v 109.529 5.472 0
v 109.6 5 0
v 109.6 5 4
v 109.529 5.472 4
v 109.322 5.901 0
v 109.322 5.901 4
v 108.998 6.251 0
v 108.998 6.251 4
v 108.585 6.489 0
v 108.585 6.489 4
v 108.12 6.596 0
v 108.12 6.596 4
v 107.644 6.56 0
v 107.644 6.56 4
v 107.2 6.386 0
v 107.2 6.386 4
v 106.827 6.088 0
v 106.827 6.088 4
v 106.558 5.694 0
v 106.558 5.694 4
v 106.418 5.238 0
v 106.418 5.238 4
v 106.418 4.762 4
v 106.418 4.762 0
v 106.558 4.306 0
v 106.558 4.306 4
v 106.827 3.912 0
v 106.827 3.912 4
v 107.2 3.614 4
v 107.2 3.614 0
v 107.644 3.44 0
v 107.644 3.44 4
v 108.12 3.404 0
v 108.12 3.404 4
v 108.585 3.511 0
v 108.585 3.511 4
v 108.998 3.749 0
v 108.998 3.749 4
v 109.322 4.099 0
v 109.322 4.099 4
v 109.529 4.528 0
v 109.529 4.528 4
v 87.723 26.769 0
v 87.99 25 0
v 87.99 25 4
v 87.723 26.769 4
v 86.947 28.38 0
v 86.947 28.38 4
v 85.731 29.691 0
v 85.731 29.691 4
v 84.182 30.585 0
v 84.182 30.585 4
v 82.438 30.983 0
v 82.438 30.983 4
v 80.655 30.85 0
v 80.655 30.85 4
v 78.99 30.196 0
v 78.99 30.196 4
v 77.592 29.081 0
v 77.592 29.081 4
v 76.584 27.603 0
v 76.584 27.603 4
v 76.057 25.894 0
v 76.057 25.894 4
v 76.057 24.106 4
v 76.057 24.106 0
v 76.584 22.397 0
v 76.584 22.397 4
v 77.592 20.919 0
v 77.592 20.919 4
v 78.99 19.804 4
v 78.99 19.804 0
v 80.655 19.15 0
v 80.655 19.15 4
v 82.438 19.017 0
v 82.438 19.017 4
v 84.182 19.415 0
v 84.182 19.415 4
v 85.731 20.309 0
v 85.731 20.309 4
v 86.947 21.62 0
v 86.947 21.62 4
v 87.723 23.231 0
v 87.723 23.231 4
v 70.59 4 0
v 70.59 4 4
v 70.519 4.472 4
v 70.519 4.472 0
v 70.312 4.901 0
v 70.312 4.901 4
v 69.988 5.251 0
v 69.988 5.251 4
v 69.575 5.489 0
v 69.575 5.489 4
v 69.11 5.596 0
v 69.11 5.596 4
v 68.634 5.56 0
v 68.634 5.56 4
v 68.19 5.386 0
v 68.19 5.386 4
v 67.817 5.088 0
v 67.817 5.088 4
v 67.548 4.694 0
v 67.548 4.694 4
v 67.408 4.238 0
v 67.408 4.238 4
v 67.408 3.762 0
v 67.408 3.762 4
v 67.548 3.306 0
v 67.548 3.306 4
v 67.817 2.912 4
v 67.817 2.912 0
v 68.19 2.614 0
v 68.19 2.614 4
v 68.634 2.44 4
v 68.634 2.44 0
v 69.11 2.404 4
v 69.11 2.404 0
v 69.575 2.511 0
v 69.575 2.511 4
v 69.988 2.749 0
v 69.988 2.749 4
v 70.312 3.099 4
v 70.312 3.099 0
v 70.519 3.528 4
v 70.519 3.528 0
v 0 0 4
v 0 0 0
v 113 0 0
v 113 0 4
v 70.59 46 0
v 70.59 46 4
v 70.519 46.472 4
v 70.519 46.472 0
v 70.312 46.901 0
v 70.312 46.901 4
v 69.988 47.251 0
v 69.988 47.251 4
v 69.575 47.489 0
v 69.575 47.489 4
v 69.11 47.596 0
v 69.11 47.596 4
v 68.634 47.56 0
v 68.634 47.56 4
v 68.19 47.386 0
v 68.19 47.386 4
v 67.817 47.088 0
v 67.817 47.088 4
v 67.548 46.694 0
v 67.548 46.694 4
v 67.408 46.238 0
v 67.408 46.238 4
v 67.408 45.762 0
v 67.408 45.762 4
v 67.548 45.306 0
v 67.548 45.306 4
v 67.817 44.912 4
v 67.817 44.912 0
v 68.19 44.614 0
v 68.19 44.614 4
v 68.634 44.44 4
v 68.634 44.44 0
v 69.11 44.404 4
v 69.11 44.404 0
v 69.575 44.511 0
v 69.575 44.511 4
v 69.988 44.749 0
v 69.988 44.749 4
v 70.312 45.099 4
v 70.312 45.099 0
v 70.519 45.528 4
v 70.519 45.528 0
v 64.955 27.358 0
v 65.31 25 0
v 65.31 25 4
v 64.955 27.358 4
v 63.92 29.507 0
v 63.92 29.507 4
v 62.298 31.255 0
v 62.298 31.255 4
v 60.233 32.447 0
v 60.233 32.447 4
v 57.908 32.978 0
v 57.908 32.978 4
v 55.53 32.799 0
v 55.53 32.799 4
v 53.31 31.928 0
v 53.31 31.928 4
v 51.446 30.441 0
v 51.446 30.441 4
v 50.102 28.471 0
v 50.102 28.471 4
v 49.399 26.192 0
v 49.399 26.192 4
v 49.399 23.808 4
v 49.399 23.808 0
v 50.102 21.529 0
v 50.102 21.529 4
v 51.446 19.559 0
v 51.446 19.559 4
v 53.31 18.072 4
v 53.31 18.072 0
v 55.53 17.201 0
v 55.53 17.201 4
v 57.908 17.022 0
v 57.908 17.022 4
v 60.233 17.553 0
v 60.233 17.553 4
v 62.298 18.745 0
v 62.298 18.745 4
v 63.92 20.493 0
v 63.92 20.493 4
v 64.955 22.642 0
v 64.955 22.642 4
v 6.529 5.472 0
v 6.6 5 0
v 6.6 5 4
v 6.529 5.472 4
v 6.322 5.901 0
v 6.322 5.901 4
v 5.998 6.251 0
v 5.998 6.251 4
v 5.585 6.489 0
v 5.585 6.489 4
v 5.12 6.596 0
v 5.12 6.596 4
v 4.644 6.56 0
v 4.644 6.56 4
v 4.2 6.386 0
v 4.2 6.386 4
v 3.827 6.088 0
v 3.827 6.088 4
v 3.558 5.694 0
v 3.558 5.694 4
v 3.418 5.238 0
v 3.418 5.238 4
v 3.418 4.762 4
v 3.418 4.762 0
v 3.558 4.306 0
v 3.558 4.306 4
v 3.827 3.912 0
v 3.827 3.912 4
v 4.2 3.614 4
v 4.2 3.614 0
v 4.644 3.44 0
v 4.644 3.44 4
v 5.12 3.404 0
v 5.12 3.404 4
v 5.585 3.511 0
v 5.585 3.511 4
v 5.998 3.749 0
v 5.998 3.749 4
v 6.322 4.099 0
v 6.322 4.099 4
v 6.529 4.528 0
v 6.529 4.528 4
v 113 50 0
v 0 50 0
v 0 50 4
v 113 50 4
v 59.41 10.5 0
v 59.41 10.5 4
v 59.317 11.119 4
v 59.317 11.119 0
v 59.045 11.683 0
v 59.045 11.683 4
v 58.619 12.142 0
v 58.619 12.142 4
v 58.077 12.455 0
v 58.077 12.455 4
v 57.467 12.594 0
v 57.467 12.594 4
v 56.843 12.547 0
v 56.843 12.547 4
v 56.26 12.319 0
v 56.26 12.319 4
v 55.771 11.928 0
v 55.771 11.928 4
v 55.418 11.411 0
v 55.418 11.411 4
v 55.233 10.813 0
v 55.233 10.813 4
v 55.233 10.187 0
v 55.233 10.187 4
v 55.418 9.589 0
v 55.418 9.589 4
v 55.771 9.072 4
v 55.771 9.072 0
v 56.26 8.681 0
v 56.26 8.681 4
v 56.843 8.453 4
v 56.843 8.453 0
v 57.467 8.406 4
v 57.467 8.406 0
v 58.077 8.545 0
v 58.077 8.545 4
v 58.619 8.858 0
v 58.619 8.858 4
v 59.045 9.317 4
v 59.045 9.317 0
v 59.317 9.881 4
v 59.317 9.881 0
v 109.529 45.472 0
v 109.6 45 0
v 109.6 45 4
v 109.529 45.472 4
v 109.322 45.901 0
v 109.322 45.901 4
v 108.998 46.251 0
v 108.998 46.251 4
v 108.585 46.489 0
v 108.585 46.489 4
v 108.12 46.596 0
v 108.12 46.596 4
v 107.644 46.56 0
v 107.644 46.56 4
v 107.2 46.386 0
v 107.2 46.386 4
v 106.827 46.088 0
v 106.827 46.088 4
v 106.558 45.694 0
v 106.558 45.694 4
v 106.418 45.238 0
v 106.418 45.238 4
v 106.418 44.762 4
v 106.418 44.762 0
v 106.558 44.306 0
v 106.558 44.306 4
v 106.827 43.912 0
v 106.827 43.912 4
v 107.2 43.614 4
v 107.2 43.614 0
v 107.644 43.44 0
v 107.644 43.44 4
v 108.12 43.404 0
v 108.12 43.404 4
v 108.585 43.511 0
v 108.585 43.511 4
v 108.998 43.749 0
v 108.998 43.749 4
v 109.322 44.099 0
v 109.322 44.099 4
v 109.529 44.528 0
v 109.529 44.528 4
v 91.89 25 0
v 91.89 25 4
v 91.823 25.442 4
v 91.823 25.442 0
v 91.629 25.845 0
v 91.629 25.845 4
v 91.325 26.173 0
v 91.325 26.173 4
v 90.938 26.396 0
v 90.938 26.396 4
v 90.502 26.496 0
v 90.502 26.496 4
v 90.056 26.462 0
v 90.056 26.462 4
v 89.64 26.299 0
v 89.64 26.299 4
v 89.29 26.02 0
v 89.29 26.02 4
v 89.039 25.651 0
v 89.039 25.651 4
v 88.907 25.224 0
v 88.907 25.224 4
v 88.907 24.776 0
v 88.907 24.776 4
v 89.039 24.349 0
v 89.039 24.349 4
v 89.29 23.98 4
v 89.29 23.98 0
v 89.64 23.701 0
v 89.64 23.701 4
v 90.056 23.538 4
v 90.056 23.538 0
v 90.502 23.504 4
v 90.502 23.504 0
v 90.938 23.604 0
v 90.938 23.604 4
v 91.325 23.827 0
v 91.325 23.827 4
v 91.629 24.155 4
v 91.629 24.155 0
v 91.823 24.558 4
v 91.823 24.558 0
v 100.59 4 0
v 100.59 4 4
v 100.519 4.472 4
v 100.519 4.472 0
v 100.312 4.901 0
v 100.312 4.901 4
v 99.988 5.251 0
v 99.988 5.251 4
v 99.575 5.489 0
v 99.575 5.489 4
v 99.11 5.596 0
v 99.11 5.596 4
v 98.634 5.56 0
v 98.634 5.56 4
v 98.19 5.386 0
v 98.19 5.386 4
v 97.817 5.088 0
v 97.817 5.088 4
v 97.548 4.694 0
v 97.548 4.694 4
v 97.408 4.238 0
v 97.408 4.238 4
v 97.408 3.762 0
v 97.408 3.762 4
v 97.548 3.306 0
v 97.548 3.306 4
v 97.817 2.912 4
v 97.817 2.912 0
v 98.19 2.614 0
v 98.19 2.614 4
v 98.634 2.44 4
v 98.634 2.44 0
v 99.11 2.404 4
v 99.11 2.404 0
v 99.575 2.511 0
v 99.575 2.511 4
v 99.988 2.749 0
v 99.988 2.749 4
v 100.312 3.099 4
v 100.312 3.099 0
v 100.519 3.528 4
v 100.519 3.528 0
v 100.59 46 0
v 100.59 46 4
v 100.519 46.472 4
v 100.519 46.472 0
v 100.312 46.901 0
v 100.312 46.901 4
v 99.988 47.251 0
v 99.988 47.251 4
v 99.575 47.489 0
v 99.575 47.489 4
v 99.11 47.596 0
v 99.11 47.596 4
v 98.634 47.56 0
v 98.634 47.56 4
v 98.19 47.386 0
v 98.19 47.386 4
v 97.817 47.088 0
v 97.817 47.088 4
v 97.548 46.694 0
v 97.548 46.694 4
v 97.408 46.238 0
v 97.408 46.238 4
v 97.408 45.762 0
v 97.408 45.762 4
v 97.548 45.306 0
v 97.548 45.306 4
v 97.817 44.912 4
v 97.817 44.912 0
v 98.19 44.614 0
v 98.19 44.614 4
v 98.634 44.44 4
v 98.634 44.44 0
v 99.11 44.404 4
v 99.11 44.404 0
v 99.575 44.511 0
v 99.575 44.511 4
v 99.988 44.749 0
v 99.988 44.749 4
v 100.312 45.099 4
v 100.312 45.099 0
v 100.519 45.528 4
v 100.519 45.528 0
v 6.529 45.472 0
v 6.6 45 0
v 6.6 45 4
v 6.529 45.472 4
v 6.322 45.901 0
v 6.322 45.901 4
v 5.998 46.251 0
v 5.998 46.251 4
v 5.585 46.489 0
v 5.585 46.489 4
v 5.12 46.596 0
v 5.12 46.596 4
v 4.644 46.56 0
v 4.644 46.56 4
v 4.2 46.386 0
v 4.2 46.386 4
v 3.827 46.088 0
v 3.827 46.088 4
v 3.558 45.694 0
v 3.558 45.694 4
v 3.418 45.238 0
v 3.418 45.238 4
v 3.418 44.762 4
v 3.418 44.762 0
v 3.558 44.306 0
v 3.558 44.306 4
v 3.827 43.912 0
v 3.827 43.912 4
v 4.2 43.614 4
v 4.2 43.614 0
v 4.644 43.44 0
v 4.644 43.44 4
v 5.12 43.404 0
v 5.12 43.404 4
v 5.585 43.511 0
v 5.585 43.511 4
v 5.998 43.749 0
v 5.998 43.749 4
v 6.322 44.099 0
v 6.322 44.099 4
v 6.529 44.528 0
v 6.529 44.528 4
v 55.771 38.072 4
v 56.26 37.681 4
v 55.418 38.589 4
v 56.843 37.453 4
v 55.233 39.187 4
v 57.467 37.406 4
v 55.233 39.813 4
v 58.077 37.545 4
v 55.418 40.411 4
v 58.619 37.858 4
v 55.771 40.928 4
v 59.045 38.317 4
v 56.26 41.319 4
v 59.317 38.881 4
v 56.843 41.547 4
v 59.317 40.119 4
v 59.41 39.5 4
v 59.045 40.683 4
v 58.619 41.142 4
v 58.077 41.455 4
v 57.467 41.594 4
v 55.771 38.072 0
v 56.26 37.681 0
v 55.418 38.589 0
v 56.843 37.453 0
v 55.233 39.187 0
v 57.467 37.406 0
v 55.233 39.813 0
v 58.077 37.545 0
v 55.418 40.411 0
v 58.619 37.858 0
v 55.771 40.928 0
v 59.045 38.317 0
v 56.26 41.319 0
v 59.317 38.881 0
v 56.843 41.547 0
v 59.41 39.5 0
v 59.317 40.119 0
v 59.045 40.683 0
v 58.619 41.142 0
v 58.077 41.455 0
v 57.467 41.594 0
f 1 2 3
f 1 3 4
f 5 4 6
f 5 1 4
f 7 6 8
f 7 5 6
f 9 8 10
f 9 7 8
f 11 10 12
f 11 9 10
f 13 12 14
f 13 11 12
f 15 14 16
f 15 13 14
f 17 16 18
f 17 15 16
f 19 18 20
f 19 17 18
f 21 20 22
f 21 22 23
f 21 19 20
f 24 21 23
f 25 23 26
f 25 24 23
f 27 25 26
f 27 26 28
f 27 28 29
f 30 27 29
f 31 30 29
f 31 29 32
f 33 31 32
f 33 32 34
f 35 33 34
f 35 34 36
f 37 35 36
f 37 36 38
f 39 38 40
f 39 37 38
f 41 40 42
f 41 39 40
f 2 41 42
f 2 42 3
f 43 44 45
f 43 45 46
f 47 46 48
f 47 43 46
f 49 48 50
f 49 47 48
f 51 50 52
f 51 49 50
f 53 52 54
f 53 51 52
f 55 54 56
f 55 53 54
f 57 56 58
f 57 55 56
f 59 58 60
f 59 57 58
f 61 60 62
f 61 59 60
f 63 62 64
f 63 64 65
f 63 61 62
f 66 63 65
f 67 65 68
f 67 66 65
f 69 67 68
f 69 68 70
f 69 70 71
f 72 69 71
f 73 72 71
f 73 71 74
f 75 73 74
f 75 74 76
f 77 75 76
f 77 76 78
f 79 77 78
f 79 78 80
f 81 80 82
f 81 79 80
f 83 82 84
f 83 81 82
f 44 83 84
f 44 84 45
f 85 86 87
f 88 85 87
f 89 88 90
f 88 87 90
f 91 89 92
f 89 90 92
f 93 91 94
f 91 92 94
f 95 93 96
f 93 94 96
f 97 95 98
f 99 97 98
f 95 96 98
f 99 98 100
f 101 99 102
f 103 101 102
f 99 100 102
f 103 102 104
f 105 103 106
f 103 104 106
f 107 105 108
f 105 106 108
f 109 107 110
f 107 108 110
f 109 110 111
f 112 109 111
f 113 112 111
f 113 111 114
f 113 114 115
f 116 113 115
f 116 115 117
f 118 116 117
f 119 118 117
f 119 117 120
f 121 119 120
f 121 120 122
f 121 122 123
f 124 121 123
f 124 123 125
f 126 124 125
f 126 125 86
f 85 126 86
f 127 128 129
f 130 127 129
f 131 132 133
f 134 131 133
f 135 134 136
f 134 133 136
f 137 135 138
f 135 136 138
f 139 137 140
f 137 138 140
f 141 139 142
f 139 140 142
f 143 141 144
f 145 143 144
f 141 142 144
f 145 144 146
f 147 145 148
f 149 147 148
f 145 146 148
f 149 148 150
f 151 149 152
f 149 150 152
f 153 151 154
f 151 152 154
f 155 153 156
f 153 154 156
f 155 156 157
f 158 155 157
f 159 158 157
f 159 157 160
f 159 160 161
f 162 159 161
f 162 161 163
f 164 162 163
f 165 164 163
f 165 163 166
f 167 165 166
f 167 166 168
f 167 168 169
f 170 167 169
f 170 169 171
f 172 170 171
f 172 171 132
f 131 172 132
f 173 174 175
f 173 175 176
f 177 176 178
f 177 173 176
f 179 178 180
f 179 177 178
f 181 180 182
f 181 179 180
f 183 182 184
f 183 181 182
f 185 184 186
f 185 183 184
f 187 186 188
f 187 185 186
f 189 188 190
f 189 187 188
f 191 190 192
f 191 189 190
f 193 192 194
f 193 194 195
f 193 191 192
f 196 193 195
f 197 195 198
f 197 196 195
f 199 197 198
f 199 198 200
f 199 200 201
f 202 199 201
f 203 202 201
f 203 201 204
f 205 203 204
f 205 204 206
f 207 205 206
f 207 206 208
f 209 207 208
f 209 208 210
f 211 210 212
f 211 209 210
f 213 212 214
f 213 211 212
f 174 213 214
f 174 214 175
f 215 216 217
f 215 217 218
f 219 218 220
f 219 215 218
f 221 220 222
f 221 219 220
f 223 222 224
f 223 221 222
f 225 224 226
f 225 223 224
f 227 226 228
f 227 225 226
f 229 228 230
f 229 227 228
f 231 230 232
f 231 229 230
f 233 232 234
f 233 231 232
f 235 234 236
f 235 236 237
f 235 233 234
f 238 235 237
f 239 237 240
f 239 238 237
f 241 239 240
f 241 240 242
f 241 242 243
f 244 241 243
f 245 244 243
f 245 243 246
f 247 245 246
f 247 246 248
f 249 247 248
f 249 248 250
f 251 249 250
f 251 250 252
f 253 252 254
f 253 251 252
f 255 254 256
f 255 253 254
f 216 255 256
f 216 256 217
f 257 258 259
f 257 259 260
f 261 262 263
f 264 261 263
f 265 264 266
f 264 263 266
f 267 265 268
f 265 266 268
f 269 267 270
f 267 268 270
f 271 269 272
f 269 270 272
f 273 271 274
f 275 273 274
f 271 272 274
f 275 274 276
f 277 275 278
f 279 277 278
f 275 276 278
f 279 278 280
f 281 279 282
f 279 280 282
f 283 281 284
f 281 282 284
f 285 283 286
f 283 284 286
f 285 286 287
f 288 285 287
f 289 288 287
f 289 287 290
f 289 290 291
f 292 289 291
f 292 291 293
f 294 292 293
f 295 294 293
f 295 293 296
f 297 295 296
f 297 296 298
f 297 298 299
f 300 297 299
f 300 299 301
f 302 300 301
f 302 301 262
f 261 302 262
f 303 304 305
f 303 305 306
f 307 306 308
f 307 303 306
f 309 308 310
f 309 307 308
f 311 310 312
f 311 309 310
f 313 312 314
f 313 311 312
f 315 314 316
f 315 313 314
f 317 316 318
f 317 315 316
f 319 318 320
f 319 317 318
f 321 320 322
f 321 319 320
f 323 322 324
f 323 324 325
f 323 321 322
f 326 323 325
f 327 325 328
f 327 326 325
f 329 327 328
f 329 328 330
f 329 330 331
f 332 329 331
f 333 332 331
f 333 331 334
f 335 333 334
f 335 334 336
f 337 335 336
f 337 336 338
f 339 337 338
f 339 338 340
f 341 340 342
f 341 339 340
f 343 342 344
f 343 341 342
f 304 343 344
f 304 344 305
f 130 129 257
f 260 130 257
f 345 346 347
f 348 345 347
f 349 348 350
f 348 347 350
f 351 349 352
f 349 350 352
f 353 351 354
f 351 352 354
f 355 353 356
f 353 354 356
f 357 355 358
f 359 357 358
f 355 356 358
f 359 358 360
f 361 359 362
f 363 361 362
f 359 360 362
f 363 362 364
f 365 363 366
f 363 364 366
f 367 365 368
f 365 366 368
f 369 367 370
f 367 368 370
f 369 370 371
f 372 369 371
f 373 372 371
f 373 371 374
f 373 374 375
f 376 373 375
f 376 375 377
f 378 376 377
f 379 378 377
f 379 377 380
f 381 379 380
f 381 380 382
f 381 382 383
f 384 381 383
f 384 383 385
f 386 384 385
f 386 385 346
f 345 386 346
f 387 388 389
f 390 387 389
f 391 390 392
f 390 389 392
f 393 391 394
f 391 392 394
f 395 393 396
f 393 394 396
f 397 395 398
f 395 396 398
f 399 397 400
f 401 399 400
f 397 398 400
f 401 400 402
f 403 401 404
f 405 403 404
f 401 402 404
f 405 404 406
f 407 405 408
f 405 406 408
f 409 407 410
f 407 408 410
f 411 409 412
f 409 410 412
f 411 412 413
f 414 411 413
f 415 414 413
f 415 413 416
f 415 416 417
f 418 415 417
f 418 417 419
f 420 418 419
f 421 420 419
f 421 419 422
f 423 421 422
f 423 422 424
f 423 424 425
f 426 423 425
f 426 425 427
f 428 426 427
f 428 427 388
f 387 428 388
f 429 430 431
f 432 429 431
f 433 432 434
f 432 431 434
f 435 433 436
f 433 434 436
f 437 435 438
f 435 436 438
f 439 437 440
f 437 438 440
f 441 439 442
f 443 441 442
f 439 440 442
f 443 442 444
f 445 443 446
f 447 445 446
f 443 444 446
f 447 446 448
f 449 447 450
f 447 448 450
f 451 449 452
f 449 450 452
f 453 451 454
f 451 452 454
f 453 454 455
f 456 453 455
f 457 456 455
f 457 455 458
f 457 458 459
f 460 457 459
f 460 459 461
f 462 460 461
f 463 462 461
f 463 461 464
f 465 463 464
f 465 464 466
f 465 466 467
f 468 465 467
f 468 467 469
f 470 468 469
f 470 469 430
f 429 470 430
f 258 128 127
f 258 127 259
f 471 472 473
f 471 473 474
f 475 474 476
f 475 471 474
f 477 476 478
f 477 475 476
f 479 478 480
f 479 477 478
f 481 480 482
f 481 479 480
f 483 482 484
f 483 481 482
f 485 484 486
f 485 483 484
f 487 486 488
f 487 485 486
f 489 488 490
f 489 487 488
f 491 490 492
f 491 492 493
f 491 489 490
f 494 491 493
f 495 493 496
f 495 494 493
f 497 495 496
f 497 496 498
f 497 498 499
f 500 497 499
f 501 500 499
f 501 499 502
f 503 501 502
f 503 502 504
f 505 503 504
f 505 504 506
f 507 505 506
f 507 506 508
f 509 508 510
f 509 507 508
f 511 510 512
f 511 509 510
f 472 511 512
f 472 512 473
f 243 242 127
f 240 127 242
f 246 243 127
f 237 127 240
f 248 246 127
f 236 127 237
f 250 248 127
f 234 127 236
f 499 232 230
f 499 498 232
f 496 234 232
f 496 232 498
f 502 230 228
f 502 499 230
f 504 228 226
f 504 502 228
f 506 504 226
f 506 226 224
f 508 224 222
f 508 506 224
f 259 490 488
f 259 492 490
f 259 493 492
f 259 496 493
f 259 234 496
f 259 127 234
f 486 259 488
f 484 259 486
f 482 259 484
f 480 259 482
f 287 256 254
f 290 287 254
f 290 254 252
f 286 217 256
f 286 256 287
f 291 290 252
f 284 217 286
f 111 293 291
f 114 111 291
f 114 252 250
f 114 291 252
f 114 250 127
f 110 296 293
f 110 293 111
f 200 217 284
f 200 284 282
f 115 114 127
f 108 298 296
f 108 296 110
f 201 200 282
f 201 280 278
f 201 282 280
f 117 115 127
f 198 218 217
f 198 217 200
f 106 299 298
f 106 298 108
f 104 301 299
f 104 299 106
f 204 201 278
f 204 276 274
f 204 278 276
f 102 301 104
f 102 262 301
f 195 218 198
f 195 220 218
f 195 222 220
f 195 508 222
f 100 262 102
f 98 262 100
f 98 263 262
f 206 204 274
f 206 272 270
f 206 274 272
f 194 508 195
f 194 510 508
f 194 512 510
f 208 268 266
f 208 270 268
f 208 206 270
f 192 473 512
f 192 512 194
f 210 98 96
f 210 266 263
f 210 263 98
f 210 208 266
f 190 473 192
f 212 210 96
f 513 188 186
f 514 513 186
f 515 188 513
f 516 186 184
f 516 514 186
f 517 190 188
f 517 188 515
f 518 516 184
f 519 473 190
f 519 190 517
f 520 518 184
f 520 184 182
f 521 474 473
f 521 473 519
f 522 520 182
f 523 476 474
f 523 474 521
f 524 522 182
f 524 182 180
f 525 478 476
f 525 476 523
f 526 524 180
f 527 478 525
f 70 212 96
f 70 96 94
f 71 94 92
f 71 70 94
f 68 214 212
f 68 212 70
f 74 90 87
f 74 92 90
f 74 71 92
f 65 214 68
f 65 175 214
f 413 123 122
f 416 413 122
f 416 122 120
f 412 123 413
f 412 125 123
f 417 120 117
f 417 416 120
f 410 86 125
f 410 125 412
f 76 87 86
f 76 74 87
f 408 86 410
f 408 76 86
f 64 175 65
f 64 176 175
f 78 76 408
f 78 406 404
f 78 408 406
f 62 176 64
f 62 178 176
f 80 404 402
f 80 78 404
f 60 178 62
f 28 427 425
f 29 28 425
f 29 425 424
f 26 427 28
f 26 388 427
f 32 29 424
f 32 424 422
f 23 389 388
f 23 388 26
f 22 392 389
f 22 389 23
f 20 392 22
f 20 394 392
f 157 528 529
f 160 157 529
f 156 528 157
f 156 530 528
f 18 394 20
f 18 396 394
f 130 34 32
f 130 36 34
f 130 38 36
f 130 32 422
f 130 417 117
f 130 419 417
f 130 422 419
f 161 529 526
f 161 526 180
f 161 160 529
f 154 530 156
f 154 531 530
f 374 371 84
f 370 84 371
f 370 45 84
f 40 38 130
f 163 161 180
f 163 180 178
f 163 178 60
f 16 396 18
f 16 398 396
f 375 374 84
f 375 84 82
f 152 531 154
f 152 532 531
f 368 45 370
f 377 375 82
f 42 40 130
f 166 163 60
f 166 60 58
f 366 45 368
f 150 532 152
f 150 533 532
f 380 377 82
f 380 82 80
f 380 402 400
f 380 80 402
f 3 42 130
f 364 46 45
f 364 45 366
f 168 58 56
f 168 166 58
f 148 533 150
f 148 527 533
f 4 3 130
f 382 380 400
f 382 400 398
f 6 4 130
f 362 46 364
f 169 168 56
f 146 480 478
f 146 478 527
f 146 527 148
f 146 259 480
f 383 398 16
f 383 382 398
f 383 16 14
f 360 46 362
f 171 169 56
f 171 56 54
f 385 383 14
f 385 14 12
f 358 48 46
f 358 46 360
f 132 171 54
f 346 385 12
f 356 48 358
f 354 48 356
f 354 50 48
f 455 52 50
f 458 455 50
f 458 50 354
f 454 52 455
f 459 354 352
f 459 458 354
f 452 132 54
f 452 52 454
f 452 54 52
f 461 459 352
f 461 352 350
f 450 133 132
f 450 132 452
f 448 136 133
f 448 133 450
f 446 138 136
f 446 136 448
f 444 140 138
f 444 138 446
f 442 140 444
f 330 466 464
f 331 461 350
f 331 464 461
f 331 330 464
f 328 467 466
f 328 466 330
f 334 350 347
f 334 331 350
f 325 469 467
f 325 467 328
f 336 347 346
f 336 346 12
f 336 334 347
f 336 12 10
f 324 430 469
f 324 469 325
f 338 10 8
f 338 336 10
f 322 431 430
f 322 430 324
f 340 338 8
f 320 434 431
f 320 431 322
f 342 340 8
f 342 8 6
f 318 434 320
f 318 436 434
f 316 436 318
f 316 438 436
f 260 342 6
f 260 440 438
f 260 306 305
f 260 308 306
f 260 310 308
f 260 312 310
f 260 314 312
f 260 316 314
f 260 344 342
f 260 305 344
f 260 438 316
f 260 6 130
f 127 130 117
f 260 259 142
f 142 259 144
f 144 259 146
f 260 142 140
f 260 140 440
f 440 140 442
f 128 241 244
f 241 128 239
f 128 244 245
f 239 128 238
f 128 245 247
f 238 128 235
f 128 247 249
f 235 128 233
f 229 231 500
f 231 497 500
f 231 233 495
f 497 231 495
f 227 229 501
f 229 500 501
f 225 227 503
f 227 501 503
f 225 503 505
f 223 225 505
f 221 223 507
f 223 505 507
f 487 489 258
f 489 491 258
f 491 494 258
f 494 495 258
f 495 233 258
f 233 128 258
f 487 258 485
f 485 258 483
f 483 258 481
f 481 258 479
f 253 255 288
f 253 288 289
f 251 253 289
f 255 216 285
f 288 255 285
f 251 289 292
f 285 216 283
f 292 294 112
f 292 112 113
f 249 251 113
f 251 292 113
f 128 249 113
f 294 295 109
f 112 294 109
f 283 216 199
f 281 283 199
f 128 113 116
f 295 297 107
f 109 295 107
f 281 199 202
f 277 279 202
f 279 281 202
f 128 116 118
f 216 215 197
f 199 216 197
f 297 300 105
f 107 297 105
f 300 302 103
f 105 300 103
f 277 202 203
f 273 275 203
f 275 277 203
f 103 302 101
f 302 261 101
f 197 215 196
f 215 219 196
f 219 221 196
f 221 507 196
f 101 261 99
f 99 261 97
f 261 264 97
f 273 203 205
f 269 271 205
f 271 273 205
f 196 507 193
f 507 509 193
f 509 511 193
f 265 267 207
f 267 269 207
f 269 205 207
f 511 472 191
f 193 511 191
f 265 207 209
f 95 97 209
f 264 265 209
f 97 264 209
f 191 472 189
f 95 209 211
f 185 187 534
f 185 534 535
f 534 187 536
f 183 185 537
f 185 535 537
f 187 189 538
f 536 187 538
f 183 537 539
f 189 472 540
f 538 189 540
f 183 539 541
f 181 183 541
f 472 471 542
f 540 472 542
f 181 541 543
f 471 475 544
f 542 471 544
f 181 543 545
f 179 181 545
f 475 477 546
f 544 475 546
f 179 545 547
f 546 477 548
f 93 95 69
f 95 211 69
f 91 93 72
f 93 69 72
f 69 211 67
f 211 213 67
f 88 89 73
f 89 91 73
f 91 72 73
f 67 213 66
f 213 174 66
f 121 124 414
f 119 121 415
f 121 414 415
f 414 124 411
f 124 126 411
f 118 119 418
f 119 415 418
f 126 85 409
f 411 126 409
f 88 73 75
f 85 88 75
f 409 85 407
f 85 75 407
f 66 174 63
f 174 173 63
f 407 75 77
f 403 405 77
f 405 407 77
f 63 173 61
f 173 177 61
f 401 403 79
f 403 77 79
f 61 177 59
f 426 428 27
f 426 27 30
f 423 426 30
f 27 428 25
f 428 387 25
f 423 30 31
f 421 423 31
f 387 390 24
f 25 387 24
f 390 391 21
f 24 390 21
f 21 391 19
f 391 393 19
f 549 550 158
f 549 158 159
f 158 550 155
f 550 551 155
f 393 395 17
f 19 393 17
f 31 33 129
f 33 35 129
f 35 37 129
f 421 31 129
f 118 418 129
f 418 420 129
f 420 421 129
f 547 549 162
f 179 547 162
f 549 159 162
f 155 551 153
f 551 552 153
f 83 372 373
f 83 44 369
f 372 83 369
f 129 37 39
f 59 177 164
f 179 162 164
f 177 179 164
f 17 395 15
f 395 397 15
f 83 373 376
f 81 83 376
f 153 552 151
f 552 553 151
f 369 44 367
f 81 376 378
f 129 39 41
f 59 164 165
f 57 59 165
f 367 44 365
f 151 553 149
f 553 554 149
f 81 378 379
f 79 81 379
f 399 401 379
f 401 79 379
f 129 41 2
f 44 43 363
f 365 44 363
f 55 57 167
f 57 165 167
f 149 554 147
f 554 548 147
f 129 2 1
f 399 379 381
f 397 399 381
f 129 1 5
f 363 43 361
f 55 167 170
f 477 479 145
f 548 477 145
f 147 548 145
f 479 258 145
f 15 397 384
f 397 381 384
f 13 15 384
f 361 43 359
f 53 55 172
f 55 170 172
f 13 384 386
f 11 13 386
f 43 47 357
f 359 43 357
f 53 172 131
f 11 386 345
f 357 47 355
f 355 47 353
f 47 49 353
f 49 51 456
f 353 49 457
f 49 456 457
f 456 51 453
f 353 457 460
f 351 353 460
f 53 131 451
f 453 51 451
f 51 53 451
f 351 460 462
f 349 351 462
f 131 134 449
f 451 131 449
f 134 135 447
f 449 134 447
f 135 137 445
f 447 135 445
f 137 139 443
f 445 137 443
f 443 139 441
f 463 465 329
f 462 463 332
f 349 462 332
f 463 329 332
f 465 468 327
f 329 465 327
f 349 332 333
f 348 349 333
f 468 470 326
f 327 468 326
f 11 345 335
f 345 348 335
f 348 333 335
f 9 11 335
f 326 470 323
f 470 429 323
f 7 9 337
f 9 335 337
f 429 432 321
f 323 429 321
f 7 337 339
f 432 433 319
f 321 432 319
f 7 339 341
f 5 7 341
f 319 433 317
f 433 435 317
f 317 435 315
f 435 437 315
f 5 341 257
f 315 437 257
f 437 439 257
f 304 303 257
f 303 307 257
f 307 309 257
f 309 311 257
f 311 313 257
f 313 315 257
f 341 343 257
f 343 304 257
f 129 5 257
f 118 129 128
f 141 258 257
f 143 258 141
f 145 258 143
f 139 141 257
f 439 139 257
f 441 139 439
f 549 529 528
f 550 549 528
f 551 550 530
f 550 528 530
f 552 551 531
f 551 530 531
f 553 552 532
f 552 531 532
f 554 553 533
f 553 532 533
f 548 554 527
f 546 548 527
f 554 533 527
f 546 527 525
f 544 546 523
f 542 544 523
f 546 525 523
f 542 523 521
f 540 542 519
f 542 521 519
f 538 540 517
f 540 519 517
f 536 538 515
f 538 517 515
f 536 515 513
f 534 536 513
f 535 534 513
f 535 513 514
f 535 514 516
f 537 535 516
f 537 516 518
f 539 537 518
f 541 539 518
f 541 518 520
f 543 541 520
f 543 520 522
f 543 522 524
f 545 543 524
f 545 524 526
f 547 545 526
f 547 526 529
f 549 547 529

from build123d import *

# Parameters (mm, degrees)
SKETCH_1_W          = 113
SKETCH_1_H          = 50
SKETCH_1_R          = 1.6
SKETCH_1_R_2        = 8
SKETCH_1_R_3        = 6
EXTRUDE_1_DEPTH     = 4
SKETCH_2_R          = 1.5
SKETCH_2_R_2        = 1.6
SKETCH_2_R_3        = 2.1
CUT_EXTRUDE_1_DEPTH = 124.632519994


with BuildPart() as part:
    # ｽｹｯﾁ1 → ﾎﾞｽ - 押し出し1 (new body)
    with BuildSketch(Plane.XY):
        with Locations((56.5, 25)):
            Rectangle(SKETCH_1_W, SKETCH_1_H)
        with Locations((5, 45)):
            Circle(SKETCH_1_R, mode=Mode.SUBTRACT)
        with Locations((5, 5)):
            Circle(SKETCH_1_R, mode=Mode.SUBTRACT)
        with Locations((108, 45)):
            Circle(SKETCH_1_R, mode=Mode.SUBTRACT)
        with Locations((108, 5)):
            Circle(SKETCH_1_R, mode=Mode.SUBTRACT)
        with Locations((57.31, 25)):
            Circle(SKETCH_1_R_2, mode=Mode.SUBTRACT)
        with Locations((81.99, 25)):
            Circle(SKETCH_1_R_3, mode=Mode.SUBTRACT)
    extrude(amount=EXTRUDE_1_DEPTH)

    # ｽｹｯﾁ2 → ｶｯﾄ - 押し出し1 (cut, through all)
    with BuildSketch(Plane.XY.offset(4)):
        with Locations((90.39, 25)):
            Circle(SKETCH_2_R)
        with Locations((98.99, 46)):
            Circle(SKETCH_2_R_2)
        with Locations((98.99, 4)):
            Circle(SKETCH_2_R_2)
        with Locations((68.99, 4)):
            Circle(SKETCH_2_R_2)
        with Locations((68.99, 46)):
            Circle(SKETCH_2_R_2)
        with Locations((57.31, 39.5)):
            Circle(SKETCH_2_R_3)
        with Locations((57.31, 10.5)):
            Circle(SKETCH_2_R_3)
    extrude(amount=-CUT_EXTRUDE_1_DEPTH, mode=Mode.SUBTRACT)


solid = part.part
